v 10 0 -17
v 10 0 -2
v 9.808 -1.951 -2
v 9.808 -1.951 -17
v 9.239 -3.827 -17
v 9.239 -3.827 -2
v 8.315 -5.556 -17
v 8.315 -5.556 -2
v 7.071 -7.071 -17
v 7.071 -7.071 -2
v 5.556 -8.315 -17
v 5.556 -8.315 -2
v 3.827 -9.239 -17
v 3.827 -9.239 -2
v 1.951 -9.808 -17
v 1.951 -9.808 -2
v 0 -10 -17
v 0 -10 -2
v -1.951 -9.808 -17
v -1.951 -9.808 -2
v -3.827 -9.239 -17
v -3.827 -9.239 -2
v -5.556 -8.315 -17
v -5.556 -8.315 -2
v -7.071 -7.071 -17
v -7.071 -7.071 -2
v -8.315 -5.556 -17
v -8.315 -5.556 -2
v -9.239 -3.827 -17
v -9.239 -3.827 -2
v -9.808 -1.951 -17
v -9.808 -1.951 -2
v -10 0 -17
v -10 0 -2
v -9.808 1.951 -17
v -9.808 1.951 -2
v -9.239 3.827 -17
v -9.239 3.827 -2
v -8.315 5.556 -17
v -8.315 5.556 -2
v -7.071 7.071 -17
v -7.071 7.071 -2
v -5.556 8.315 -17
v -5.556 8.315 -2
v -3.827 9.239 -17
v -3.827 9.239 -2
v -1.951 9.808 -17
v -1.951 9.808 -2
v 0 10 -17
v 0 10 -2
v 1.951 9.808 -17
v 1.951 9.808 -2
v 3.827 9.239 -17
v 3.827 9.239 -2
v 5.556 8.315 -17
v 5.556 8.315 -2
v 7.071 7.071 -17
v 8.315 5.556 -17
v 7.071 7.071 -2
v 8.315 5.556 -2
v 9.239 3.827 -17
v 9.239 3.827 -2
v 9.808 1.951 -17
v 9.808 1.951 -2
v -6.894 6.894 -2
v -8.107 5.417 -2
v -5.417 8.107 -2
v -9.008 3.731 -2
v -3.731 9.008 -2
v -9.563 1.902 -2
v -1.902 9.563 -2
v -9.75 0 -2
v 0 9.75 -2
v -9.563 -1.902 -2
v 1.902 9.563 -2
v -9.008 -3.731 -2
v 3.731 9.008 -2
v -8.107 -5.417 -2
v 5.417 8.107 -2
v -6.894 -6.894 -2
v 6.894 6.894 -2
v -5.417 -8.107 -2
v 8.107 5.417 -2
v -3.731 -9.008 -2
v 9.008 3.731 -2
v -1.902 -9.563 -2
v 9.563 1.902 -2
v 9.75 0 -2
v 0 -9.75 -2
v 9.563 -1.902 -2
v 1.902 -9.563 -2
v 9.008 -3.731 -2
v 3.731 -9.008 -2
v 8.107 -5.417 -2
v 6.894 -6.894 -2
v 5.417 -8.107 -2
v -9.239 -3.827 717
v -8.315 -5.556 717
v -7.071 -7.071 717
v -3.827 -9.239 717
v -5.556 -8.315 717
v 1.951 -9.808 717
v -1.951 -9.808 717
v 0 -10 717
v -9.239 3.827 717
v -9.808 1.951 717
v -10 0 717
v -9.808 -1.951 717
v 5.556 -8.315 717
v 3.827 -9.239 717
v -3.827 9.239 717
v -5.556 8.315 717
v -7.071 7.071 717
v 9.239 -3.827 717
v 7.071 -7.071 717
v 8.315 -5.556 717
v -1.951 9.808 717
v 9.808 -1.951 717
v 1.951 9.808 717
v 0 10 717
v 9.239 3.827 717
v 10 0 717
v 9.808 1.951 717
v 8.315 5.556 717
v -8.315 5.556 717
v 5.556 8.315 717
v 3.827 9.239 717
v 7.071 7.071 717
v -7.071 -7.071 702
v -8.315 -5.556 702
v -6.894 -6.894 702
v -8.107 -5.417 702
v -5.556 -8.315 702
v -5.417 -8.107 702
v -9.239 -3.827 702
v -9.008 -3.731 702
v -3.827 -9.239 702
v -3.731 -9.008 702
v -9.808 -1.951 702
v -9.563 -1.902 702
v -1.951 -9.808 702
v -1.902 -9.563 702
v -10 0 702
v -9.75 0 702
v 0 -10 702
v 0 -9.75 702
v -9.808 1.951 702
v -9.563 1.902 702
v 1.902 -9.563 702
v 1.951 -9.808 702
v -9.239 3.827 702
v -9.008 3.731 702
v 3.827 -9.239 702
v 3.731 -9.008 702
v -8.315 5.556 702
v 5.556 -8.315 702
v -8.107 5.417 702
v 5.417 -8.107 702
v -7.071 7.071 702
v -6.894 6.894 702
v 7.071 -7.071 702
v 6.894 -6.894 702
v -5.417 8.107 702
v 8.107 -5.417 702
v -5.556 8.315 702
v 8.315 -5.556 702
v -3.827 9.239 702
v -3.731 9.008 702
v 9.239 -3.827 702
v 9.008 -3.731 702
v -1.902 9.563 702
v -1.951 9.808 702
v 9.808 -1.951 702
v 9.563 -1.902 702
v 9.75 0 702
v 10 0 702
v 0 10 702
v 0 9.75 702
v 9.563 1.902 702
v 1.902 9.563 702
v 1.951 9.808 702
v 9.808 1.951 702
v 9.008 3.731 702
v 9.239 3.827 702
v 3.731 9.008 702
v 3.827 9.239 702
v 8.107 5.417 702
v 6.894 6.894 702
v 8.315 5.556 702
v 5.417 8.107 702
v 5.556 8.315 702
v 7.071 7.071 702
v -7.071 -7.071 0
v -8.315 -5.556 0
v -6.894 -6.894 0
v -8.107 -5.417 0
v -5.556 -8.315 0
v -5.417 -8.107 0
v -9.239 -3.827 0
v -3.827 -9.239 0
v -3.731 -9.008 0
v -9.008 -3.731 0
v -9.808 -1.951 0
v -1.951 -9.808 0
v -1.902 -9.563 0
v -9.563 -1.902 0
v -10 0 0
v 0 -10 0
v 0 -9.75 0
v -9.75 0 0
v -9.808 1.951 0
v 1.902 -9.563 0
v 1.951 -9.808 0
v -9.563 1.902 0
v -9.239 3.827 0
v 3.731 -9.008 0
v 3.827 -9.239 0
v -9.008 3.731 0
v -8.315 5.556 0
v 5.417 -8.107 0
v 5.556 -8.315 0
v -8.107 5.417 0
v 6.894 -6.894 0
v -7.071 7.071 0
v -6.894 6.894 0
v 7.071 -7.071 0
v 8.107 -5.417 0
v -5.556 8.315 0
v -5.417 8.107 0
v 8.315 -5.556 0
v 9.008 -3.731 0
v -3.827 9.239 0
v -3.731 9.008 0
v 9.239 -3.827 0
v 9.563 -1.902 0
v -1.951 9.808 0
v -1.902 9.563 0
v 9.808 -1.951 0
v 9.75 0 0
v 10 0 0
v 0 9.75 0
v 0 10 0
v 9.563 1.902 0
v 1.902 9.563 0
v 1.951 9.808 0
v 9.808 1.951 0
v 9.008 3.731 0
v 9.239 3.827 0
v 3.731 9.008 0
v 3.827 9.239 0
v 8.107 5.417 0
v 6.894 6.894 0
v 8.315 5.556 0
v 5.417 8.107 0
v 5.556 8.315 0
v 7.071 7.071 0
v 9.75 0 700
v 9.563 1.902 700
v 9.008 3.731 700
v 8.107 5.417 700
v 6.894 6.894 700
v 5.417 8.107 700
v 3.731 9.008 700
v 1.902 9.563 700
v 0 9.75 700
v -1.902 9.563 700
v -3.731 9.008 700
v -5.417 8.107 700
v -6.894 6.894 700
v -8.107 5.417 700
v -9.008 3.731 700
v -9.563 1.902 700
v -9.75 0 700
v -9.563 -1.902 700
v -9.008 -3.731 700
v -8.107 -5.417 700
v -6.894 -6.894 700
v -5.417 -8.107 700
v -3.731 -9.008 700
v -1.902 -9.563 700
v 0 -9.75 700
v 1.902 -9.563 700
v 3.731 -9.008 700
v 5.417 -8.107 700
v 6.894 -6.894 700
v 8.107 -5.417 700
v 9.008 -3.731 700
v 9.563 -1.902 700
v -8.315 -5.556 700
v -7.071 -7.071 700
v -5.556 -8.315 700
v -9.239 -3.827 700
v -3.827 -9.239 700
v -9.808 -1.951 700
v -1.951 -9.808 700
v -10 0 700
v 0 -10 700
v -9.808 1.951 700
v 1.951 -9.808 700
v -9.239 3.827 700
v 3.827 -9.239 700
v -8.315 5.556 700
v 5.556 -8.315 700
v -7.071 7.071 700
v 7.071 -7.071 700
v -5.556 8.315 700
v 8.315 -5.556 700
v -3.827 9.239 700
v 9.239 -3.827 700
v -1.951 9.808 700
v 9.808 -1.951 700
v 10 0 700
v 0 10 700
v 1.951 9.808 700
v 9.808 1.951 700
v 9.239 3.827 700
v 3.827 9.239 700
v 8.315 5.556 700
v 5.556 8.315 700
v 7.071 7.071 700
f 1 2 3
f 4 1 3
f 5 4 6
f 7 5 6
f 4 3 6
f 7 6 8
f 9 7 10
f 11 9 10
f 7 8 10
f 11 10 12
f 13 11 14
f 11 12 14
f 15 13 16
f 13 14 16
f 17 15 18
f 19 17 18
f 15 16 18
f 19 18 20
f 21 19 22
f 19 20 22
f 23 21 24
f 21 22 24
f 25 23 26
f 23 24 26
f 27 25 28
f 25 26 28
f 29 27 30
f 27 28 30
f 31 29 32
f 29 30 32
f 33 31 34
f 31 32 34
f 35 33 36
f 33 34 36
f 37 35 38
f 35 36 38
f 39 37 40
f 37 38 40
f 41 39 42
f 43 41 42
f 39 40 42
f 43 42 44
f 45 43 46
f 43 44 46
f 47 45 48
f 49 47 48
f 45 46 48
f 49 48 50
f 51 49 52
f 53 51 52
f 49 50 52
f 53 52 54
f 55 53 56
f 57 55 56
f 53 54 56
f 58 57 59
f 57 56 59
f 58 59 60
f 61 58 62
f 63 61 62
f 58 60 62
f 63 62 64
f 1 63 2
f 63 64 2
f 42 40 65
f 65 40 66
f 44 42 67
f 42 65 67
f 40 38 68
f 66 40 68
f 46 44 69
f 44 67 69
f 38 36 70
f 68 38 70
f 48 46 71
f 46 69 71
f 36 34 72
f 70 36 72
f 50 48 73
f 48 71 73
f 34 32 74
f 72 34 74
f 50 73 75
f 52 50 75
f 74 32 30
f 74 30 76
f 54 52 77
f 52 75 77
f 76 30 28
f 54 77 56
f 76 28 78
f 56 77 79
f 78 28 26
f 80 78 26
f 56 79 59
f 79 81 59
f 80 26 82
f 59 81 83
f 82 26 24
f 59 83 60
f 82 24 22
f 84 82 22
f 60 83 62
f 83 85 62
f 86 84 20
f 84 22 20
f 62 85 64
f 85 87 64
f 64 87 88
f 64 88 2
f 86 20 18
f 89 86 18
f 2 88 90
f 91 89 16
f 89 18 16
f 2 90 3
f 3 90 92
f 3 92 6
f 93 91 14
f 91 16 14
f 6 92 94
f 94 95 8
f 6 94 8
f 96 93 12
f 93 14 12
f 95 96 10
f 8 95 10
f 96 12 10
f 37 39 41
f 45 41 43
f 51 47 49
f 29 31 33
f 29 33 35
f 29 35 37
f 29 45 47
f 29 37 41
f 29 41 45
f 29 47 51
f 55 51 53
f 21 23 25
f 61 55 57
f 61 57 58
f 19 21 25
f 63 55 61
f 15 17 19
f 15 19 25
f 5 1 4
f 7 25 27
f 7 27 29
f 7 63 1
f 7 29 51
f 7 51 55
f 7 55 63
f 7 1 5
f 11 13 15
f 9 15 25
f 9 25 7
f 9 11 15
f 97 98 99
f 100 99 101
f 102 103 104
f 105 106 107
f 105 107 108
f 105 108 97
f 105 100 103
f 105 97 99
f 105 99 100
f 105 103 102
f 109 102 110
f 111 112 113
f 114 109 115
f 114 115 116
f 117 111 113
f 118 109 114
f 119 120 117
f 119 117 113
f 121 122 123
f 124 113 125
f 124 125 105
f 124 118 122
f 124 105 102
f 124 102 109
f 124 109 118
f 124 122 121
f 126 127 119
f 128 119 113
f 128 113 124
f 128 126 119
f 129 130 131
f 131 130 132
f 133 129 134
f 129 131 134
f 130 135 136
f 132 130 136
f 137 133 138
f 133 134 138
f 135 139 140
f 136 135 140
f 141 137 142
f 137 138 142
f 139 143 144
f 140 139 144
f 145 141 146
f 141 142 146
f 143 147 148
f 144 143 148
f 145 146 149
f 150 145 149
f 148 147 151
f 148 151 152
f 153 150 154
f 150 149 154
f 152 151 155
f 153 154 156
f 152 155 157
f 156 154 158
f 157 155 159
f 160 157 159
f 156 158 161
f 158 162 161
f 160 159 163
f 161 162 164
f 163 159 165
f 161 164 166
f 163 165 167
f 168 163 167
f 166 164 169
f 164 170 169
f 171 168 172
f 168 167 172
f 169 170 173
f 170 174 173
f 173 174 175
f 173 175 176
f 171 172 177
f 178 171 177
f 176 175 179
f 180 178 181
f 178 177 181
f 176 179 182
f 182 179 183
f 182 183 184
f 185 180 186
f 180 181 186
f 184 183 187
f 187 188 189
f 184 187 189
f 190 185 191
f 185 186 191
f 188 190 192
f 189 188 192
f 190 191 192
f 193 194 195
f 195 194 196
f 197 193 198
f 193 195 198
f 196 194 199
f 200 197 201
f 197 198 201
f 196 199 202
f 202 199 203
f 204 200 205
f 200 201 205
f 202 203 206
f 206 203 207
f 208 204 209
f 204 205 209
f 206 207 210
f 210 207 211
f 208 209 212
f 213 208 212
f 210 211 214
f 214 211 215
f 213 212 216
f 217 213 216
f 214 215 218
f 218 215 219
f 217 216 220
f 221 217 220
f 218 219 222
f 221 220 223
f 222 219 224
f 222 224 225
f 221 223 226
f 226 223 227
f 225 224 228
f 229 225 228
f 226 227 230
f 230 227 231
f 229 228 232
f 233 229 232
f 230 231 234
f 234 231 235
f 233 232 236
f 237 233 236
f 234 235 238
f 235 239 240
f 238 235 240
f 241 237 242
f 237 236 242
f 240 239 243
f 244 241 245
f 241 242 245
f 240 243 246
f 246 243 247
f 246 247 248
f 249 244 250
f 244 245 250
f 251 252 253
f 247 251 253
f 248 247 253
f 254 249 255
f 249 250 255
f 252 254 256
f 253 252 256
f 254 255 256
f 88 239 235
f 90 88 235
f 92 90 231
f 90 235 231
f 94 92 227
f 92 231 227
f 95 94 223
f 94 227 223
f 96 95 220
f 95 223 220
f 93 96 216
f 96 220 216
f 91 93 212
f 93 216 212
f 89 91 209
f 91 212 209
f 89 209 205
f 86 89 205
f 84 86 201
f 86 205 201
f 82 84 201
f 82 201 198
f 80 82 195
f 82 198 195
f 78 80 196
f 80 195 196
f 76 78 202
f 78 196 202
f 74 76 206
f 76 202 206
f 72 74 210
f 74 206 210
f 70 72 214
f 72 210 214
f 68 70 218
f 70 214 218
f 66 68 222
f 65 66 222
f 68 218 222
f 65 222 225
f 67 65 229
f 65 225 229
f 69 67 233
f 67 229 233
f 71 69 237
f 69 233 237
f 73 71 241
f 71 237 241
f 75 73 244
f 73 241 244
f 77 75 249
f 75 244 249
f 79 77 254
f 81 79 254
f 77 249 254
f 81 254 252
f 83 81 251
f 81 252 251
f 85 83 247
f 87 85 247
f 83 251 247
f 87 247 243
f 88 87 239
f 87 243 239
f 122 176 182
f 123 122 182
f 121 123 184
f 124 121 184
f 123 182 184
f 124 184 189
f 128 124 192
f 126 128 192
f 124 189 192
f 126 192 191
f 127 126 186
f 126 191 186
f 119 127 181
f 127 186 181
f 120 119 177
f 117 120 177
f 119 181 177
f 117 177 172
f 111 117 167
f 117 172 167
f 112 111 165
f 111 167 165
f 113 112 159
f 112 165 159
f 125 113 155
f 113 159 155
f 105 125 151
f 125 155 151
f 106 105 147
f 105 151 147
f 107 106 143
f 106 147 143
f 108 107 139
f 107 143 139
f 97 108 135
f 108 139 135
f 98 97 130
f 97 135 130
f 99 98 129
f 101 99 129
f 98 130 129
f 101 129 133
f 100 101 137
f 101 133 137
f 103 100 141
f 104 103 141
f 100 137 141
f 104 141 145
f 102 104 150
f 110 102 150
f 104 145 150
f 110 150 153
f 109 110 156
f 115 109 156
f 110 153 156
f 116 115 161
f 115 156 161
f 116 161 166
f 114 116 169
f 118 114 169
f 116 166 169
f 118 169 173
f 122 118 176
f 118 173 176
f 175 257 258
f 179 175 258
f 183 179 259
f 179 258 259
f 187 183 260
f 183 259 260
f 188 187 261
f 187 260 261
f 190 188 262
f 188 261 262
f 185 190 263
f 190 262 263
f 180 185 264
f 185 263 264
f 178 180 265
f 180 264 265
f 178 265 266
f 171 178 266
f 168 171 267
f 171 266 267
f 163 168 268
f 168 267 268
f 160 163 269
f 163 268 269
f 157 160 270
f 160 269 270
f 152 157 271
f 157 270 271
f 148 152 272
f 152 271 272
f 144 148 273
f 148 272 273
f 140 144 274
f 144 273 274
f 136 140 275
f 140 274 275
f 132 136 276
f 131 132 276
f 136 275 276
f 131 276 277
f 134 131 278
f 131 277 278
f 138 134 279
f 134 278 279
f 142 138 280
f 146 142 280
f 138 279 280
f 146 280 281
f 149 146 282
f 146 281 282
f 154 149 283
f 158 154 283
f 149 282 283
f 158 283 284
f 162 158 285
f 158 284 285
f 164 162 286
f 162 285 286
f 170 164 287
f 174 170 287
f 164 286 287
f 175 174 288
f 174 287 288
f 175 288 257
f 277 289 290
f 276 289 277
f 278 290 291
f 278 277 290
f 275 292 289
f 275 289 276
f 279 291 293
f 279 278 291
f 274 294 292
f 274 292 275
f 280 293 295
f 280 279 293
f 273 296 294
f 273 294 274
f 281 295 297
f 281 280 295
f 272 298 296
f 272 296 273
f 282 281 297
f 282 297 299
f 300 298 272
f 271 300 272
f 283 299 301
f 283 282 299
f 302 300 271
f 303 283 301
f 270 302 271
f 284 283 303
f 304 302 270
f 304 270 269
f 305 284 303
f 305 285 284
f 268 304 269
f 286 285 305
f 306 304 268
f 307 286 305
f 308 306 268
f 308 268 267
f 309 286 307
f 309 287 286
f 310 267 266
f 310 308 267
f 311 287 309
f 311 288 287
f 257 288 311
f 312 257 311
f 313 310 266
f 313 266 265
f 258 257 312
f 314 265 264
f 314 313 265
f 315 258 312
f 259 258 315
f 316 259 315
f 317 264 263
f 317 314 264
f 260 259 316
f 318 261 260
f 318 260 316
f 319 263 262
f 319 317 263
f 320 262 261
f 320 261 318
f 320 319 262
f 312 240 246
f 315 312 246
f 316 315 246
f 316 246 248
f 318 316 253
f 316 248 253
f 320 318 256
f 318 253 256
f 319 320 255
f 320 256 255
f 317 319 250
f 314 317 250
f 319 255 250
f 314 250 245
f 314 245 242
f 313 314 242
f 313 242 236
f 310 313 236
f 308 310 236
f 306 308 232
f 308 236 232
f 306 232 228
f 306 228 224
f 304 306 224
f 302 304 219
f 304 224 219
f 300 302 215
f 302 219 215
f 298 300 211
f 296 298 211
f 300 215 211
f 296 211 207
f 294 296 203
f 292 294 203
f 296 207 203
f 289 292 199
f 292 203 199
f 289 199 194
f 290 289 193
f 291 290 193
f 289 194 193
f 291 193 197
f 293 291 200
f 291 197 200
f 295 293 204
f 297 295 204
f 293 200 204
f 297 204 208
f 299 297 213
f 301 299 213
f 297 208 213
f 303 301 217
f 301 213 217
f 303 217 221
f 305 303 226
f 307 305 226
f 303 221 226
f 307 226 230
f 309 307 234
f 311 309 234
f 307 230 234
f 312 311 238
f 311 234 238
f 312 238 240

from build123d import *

# Parameters (mm, degrees)
F0_R     = 10
F1_DEPTH = 700
F2_R     = 9.75
F3_DEPTH = 2
F4_R     = 10
F4_R_2   = 9.75
F5_DEPTH = 15
F6_R     = 9.75
F7_DEPTH = 2
F8_R     = 10
F8_R_2   = 9.75
F9_DEPTH = 15


with BuildPart() as f1:
    # F0 (on Top) → F1 (new body)
    with BuildSketch(Plane.XY):
        Circle(F0_R)
    extrude(amount=F1_DEPTH)

    # F2 (on face) → F3 (join)
    with BuildSketch(Plane(origin=(0, 0, 0), x_dir=(1, 0, 0), z_dir=(0, 0, -1))):
        Circle(F2_R)
    extrude(amount=F3_DEPTH)

    # F4 (on face) → F5 (join)
    with BuildSketch(Plane(origin=(0, 0, -2), x_dir=(1, 0, 0), z_dir=(0, 0, -1))):
        Circle(F4_R)
        Circle(F4_R_2, mode=Mode.SUBTRACT)
        Circle(F4_R_2)
    extrude(amount=F5_DEPTH)

    # F6 (on face) → F7 (join)
    with BuildSketch(Plane.XY.offset(700)):
        Circle(F6_R)
    extrude(amount=F7_DEPTH)

    # F8 (on face) → F9 (join)
    with BuildSketch(Plane.XY.offset(702)):
        Circle(F8_R)
        Circle(F8_R_2, mode=Mode.SUBTRACT)
        Circle(F8_R_2)
    extrude(amount=F9_DEPTH)


solid = f1.part
